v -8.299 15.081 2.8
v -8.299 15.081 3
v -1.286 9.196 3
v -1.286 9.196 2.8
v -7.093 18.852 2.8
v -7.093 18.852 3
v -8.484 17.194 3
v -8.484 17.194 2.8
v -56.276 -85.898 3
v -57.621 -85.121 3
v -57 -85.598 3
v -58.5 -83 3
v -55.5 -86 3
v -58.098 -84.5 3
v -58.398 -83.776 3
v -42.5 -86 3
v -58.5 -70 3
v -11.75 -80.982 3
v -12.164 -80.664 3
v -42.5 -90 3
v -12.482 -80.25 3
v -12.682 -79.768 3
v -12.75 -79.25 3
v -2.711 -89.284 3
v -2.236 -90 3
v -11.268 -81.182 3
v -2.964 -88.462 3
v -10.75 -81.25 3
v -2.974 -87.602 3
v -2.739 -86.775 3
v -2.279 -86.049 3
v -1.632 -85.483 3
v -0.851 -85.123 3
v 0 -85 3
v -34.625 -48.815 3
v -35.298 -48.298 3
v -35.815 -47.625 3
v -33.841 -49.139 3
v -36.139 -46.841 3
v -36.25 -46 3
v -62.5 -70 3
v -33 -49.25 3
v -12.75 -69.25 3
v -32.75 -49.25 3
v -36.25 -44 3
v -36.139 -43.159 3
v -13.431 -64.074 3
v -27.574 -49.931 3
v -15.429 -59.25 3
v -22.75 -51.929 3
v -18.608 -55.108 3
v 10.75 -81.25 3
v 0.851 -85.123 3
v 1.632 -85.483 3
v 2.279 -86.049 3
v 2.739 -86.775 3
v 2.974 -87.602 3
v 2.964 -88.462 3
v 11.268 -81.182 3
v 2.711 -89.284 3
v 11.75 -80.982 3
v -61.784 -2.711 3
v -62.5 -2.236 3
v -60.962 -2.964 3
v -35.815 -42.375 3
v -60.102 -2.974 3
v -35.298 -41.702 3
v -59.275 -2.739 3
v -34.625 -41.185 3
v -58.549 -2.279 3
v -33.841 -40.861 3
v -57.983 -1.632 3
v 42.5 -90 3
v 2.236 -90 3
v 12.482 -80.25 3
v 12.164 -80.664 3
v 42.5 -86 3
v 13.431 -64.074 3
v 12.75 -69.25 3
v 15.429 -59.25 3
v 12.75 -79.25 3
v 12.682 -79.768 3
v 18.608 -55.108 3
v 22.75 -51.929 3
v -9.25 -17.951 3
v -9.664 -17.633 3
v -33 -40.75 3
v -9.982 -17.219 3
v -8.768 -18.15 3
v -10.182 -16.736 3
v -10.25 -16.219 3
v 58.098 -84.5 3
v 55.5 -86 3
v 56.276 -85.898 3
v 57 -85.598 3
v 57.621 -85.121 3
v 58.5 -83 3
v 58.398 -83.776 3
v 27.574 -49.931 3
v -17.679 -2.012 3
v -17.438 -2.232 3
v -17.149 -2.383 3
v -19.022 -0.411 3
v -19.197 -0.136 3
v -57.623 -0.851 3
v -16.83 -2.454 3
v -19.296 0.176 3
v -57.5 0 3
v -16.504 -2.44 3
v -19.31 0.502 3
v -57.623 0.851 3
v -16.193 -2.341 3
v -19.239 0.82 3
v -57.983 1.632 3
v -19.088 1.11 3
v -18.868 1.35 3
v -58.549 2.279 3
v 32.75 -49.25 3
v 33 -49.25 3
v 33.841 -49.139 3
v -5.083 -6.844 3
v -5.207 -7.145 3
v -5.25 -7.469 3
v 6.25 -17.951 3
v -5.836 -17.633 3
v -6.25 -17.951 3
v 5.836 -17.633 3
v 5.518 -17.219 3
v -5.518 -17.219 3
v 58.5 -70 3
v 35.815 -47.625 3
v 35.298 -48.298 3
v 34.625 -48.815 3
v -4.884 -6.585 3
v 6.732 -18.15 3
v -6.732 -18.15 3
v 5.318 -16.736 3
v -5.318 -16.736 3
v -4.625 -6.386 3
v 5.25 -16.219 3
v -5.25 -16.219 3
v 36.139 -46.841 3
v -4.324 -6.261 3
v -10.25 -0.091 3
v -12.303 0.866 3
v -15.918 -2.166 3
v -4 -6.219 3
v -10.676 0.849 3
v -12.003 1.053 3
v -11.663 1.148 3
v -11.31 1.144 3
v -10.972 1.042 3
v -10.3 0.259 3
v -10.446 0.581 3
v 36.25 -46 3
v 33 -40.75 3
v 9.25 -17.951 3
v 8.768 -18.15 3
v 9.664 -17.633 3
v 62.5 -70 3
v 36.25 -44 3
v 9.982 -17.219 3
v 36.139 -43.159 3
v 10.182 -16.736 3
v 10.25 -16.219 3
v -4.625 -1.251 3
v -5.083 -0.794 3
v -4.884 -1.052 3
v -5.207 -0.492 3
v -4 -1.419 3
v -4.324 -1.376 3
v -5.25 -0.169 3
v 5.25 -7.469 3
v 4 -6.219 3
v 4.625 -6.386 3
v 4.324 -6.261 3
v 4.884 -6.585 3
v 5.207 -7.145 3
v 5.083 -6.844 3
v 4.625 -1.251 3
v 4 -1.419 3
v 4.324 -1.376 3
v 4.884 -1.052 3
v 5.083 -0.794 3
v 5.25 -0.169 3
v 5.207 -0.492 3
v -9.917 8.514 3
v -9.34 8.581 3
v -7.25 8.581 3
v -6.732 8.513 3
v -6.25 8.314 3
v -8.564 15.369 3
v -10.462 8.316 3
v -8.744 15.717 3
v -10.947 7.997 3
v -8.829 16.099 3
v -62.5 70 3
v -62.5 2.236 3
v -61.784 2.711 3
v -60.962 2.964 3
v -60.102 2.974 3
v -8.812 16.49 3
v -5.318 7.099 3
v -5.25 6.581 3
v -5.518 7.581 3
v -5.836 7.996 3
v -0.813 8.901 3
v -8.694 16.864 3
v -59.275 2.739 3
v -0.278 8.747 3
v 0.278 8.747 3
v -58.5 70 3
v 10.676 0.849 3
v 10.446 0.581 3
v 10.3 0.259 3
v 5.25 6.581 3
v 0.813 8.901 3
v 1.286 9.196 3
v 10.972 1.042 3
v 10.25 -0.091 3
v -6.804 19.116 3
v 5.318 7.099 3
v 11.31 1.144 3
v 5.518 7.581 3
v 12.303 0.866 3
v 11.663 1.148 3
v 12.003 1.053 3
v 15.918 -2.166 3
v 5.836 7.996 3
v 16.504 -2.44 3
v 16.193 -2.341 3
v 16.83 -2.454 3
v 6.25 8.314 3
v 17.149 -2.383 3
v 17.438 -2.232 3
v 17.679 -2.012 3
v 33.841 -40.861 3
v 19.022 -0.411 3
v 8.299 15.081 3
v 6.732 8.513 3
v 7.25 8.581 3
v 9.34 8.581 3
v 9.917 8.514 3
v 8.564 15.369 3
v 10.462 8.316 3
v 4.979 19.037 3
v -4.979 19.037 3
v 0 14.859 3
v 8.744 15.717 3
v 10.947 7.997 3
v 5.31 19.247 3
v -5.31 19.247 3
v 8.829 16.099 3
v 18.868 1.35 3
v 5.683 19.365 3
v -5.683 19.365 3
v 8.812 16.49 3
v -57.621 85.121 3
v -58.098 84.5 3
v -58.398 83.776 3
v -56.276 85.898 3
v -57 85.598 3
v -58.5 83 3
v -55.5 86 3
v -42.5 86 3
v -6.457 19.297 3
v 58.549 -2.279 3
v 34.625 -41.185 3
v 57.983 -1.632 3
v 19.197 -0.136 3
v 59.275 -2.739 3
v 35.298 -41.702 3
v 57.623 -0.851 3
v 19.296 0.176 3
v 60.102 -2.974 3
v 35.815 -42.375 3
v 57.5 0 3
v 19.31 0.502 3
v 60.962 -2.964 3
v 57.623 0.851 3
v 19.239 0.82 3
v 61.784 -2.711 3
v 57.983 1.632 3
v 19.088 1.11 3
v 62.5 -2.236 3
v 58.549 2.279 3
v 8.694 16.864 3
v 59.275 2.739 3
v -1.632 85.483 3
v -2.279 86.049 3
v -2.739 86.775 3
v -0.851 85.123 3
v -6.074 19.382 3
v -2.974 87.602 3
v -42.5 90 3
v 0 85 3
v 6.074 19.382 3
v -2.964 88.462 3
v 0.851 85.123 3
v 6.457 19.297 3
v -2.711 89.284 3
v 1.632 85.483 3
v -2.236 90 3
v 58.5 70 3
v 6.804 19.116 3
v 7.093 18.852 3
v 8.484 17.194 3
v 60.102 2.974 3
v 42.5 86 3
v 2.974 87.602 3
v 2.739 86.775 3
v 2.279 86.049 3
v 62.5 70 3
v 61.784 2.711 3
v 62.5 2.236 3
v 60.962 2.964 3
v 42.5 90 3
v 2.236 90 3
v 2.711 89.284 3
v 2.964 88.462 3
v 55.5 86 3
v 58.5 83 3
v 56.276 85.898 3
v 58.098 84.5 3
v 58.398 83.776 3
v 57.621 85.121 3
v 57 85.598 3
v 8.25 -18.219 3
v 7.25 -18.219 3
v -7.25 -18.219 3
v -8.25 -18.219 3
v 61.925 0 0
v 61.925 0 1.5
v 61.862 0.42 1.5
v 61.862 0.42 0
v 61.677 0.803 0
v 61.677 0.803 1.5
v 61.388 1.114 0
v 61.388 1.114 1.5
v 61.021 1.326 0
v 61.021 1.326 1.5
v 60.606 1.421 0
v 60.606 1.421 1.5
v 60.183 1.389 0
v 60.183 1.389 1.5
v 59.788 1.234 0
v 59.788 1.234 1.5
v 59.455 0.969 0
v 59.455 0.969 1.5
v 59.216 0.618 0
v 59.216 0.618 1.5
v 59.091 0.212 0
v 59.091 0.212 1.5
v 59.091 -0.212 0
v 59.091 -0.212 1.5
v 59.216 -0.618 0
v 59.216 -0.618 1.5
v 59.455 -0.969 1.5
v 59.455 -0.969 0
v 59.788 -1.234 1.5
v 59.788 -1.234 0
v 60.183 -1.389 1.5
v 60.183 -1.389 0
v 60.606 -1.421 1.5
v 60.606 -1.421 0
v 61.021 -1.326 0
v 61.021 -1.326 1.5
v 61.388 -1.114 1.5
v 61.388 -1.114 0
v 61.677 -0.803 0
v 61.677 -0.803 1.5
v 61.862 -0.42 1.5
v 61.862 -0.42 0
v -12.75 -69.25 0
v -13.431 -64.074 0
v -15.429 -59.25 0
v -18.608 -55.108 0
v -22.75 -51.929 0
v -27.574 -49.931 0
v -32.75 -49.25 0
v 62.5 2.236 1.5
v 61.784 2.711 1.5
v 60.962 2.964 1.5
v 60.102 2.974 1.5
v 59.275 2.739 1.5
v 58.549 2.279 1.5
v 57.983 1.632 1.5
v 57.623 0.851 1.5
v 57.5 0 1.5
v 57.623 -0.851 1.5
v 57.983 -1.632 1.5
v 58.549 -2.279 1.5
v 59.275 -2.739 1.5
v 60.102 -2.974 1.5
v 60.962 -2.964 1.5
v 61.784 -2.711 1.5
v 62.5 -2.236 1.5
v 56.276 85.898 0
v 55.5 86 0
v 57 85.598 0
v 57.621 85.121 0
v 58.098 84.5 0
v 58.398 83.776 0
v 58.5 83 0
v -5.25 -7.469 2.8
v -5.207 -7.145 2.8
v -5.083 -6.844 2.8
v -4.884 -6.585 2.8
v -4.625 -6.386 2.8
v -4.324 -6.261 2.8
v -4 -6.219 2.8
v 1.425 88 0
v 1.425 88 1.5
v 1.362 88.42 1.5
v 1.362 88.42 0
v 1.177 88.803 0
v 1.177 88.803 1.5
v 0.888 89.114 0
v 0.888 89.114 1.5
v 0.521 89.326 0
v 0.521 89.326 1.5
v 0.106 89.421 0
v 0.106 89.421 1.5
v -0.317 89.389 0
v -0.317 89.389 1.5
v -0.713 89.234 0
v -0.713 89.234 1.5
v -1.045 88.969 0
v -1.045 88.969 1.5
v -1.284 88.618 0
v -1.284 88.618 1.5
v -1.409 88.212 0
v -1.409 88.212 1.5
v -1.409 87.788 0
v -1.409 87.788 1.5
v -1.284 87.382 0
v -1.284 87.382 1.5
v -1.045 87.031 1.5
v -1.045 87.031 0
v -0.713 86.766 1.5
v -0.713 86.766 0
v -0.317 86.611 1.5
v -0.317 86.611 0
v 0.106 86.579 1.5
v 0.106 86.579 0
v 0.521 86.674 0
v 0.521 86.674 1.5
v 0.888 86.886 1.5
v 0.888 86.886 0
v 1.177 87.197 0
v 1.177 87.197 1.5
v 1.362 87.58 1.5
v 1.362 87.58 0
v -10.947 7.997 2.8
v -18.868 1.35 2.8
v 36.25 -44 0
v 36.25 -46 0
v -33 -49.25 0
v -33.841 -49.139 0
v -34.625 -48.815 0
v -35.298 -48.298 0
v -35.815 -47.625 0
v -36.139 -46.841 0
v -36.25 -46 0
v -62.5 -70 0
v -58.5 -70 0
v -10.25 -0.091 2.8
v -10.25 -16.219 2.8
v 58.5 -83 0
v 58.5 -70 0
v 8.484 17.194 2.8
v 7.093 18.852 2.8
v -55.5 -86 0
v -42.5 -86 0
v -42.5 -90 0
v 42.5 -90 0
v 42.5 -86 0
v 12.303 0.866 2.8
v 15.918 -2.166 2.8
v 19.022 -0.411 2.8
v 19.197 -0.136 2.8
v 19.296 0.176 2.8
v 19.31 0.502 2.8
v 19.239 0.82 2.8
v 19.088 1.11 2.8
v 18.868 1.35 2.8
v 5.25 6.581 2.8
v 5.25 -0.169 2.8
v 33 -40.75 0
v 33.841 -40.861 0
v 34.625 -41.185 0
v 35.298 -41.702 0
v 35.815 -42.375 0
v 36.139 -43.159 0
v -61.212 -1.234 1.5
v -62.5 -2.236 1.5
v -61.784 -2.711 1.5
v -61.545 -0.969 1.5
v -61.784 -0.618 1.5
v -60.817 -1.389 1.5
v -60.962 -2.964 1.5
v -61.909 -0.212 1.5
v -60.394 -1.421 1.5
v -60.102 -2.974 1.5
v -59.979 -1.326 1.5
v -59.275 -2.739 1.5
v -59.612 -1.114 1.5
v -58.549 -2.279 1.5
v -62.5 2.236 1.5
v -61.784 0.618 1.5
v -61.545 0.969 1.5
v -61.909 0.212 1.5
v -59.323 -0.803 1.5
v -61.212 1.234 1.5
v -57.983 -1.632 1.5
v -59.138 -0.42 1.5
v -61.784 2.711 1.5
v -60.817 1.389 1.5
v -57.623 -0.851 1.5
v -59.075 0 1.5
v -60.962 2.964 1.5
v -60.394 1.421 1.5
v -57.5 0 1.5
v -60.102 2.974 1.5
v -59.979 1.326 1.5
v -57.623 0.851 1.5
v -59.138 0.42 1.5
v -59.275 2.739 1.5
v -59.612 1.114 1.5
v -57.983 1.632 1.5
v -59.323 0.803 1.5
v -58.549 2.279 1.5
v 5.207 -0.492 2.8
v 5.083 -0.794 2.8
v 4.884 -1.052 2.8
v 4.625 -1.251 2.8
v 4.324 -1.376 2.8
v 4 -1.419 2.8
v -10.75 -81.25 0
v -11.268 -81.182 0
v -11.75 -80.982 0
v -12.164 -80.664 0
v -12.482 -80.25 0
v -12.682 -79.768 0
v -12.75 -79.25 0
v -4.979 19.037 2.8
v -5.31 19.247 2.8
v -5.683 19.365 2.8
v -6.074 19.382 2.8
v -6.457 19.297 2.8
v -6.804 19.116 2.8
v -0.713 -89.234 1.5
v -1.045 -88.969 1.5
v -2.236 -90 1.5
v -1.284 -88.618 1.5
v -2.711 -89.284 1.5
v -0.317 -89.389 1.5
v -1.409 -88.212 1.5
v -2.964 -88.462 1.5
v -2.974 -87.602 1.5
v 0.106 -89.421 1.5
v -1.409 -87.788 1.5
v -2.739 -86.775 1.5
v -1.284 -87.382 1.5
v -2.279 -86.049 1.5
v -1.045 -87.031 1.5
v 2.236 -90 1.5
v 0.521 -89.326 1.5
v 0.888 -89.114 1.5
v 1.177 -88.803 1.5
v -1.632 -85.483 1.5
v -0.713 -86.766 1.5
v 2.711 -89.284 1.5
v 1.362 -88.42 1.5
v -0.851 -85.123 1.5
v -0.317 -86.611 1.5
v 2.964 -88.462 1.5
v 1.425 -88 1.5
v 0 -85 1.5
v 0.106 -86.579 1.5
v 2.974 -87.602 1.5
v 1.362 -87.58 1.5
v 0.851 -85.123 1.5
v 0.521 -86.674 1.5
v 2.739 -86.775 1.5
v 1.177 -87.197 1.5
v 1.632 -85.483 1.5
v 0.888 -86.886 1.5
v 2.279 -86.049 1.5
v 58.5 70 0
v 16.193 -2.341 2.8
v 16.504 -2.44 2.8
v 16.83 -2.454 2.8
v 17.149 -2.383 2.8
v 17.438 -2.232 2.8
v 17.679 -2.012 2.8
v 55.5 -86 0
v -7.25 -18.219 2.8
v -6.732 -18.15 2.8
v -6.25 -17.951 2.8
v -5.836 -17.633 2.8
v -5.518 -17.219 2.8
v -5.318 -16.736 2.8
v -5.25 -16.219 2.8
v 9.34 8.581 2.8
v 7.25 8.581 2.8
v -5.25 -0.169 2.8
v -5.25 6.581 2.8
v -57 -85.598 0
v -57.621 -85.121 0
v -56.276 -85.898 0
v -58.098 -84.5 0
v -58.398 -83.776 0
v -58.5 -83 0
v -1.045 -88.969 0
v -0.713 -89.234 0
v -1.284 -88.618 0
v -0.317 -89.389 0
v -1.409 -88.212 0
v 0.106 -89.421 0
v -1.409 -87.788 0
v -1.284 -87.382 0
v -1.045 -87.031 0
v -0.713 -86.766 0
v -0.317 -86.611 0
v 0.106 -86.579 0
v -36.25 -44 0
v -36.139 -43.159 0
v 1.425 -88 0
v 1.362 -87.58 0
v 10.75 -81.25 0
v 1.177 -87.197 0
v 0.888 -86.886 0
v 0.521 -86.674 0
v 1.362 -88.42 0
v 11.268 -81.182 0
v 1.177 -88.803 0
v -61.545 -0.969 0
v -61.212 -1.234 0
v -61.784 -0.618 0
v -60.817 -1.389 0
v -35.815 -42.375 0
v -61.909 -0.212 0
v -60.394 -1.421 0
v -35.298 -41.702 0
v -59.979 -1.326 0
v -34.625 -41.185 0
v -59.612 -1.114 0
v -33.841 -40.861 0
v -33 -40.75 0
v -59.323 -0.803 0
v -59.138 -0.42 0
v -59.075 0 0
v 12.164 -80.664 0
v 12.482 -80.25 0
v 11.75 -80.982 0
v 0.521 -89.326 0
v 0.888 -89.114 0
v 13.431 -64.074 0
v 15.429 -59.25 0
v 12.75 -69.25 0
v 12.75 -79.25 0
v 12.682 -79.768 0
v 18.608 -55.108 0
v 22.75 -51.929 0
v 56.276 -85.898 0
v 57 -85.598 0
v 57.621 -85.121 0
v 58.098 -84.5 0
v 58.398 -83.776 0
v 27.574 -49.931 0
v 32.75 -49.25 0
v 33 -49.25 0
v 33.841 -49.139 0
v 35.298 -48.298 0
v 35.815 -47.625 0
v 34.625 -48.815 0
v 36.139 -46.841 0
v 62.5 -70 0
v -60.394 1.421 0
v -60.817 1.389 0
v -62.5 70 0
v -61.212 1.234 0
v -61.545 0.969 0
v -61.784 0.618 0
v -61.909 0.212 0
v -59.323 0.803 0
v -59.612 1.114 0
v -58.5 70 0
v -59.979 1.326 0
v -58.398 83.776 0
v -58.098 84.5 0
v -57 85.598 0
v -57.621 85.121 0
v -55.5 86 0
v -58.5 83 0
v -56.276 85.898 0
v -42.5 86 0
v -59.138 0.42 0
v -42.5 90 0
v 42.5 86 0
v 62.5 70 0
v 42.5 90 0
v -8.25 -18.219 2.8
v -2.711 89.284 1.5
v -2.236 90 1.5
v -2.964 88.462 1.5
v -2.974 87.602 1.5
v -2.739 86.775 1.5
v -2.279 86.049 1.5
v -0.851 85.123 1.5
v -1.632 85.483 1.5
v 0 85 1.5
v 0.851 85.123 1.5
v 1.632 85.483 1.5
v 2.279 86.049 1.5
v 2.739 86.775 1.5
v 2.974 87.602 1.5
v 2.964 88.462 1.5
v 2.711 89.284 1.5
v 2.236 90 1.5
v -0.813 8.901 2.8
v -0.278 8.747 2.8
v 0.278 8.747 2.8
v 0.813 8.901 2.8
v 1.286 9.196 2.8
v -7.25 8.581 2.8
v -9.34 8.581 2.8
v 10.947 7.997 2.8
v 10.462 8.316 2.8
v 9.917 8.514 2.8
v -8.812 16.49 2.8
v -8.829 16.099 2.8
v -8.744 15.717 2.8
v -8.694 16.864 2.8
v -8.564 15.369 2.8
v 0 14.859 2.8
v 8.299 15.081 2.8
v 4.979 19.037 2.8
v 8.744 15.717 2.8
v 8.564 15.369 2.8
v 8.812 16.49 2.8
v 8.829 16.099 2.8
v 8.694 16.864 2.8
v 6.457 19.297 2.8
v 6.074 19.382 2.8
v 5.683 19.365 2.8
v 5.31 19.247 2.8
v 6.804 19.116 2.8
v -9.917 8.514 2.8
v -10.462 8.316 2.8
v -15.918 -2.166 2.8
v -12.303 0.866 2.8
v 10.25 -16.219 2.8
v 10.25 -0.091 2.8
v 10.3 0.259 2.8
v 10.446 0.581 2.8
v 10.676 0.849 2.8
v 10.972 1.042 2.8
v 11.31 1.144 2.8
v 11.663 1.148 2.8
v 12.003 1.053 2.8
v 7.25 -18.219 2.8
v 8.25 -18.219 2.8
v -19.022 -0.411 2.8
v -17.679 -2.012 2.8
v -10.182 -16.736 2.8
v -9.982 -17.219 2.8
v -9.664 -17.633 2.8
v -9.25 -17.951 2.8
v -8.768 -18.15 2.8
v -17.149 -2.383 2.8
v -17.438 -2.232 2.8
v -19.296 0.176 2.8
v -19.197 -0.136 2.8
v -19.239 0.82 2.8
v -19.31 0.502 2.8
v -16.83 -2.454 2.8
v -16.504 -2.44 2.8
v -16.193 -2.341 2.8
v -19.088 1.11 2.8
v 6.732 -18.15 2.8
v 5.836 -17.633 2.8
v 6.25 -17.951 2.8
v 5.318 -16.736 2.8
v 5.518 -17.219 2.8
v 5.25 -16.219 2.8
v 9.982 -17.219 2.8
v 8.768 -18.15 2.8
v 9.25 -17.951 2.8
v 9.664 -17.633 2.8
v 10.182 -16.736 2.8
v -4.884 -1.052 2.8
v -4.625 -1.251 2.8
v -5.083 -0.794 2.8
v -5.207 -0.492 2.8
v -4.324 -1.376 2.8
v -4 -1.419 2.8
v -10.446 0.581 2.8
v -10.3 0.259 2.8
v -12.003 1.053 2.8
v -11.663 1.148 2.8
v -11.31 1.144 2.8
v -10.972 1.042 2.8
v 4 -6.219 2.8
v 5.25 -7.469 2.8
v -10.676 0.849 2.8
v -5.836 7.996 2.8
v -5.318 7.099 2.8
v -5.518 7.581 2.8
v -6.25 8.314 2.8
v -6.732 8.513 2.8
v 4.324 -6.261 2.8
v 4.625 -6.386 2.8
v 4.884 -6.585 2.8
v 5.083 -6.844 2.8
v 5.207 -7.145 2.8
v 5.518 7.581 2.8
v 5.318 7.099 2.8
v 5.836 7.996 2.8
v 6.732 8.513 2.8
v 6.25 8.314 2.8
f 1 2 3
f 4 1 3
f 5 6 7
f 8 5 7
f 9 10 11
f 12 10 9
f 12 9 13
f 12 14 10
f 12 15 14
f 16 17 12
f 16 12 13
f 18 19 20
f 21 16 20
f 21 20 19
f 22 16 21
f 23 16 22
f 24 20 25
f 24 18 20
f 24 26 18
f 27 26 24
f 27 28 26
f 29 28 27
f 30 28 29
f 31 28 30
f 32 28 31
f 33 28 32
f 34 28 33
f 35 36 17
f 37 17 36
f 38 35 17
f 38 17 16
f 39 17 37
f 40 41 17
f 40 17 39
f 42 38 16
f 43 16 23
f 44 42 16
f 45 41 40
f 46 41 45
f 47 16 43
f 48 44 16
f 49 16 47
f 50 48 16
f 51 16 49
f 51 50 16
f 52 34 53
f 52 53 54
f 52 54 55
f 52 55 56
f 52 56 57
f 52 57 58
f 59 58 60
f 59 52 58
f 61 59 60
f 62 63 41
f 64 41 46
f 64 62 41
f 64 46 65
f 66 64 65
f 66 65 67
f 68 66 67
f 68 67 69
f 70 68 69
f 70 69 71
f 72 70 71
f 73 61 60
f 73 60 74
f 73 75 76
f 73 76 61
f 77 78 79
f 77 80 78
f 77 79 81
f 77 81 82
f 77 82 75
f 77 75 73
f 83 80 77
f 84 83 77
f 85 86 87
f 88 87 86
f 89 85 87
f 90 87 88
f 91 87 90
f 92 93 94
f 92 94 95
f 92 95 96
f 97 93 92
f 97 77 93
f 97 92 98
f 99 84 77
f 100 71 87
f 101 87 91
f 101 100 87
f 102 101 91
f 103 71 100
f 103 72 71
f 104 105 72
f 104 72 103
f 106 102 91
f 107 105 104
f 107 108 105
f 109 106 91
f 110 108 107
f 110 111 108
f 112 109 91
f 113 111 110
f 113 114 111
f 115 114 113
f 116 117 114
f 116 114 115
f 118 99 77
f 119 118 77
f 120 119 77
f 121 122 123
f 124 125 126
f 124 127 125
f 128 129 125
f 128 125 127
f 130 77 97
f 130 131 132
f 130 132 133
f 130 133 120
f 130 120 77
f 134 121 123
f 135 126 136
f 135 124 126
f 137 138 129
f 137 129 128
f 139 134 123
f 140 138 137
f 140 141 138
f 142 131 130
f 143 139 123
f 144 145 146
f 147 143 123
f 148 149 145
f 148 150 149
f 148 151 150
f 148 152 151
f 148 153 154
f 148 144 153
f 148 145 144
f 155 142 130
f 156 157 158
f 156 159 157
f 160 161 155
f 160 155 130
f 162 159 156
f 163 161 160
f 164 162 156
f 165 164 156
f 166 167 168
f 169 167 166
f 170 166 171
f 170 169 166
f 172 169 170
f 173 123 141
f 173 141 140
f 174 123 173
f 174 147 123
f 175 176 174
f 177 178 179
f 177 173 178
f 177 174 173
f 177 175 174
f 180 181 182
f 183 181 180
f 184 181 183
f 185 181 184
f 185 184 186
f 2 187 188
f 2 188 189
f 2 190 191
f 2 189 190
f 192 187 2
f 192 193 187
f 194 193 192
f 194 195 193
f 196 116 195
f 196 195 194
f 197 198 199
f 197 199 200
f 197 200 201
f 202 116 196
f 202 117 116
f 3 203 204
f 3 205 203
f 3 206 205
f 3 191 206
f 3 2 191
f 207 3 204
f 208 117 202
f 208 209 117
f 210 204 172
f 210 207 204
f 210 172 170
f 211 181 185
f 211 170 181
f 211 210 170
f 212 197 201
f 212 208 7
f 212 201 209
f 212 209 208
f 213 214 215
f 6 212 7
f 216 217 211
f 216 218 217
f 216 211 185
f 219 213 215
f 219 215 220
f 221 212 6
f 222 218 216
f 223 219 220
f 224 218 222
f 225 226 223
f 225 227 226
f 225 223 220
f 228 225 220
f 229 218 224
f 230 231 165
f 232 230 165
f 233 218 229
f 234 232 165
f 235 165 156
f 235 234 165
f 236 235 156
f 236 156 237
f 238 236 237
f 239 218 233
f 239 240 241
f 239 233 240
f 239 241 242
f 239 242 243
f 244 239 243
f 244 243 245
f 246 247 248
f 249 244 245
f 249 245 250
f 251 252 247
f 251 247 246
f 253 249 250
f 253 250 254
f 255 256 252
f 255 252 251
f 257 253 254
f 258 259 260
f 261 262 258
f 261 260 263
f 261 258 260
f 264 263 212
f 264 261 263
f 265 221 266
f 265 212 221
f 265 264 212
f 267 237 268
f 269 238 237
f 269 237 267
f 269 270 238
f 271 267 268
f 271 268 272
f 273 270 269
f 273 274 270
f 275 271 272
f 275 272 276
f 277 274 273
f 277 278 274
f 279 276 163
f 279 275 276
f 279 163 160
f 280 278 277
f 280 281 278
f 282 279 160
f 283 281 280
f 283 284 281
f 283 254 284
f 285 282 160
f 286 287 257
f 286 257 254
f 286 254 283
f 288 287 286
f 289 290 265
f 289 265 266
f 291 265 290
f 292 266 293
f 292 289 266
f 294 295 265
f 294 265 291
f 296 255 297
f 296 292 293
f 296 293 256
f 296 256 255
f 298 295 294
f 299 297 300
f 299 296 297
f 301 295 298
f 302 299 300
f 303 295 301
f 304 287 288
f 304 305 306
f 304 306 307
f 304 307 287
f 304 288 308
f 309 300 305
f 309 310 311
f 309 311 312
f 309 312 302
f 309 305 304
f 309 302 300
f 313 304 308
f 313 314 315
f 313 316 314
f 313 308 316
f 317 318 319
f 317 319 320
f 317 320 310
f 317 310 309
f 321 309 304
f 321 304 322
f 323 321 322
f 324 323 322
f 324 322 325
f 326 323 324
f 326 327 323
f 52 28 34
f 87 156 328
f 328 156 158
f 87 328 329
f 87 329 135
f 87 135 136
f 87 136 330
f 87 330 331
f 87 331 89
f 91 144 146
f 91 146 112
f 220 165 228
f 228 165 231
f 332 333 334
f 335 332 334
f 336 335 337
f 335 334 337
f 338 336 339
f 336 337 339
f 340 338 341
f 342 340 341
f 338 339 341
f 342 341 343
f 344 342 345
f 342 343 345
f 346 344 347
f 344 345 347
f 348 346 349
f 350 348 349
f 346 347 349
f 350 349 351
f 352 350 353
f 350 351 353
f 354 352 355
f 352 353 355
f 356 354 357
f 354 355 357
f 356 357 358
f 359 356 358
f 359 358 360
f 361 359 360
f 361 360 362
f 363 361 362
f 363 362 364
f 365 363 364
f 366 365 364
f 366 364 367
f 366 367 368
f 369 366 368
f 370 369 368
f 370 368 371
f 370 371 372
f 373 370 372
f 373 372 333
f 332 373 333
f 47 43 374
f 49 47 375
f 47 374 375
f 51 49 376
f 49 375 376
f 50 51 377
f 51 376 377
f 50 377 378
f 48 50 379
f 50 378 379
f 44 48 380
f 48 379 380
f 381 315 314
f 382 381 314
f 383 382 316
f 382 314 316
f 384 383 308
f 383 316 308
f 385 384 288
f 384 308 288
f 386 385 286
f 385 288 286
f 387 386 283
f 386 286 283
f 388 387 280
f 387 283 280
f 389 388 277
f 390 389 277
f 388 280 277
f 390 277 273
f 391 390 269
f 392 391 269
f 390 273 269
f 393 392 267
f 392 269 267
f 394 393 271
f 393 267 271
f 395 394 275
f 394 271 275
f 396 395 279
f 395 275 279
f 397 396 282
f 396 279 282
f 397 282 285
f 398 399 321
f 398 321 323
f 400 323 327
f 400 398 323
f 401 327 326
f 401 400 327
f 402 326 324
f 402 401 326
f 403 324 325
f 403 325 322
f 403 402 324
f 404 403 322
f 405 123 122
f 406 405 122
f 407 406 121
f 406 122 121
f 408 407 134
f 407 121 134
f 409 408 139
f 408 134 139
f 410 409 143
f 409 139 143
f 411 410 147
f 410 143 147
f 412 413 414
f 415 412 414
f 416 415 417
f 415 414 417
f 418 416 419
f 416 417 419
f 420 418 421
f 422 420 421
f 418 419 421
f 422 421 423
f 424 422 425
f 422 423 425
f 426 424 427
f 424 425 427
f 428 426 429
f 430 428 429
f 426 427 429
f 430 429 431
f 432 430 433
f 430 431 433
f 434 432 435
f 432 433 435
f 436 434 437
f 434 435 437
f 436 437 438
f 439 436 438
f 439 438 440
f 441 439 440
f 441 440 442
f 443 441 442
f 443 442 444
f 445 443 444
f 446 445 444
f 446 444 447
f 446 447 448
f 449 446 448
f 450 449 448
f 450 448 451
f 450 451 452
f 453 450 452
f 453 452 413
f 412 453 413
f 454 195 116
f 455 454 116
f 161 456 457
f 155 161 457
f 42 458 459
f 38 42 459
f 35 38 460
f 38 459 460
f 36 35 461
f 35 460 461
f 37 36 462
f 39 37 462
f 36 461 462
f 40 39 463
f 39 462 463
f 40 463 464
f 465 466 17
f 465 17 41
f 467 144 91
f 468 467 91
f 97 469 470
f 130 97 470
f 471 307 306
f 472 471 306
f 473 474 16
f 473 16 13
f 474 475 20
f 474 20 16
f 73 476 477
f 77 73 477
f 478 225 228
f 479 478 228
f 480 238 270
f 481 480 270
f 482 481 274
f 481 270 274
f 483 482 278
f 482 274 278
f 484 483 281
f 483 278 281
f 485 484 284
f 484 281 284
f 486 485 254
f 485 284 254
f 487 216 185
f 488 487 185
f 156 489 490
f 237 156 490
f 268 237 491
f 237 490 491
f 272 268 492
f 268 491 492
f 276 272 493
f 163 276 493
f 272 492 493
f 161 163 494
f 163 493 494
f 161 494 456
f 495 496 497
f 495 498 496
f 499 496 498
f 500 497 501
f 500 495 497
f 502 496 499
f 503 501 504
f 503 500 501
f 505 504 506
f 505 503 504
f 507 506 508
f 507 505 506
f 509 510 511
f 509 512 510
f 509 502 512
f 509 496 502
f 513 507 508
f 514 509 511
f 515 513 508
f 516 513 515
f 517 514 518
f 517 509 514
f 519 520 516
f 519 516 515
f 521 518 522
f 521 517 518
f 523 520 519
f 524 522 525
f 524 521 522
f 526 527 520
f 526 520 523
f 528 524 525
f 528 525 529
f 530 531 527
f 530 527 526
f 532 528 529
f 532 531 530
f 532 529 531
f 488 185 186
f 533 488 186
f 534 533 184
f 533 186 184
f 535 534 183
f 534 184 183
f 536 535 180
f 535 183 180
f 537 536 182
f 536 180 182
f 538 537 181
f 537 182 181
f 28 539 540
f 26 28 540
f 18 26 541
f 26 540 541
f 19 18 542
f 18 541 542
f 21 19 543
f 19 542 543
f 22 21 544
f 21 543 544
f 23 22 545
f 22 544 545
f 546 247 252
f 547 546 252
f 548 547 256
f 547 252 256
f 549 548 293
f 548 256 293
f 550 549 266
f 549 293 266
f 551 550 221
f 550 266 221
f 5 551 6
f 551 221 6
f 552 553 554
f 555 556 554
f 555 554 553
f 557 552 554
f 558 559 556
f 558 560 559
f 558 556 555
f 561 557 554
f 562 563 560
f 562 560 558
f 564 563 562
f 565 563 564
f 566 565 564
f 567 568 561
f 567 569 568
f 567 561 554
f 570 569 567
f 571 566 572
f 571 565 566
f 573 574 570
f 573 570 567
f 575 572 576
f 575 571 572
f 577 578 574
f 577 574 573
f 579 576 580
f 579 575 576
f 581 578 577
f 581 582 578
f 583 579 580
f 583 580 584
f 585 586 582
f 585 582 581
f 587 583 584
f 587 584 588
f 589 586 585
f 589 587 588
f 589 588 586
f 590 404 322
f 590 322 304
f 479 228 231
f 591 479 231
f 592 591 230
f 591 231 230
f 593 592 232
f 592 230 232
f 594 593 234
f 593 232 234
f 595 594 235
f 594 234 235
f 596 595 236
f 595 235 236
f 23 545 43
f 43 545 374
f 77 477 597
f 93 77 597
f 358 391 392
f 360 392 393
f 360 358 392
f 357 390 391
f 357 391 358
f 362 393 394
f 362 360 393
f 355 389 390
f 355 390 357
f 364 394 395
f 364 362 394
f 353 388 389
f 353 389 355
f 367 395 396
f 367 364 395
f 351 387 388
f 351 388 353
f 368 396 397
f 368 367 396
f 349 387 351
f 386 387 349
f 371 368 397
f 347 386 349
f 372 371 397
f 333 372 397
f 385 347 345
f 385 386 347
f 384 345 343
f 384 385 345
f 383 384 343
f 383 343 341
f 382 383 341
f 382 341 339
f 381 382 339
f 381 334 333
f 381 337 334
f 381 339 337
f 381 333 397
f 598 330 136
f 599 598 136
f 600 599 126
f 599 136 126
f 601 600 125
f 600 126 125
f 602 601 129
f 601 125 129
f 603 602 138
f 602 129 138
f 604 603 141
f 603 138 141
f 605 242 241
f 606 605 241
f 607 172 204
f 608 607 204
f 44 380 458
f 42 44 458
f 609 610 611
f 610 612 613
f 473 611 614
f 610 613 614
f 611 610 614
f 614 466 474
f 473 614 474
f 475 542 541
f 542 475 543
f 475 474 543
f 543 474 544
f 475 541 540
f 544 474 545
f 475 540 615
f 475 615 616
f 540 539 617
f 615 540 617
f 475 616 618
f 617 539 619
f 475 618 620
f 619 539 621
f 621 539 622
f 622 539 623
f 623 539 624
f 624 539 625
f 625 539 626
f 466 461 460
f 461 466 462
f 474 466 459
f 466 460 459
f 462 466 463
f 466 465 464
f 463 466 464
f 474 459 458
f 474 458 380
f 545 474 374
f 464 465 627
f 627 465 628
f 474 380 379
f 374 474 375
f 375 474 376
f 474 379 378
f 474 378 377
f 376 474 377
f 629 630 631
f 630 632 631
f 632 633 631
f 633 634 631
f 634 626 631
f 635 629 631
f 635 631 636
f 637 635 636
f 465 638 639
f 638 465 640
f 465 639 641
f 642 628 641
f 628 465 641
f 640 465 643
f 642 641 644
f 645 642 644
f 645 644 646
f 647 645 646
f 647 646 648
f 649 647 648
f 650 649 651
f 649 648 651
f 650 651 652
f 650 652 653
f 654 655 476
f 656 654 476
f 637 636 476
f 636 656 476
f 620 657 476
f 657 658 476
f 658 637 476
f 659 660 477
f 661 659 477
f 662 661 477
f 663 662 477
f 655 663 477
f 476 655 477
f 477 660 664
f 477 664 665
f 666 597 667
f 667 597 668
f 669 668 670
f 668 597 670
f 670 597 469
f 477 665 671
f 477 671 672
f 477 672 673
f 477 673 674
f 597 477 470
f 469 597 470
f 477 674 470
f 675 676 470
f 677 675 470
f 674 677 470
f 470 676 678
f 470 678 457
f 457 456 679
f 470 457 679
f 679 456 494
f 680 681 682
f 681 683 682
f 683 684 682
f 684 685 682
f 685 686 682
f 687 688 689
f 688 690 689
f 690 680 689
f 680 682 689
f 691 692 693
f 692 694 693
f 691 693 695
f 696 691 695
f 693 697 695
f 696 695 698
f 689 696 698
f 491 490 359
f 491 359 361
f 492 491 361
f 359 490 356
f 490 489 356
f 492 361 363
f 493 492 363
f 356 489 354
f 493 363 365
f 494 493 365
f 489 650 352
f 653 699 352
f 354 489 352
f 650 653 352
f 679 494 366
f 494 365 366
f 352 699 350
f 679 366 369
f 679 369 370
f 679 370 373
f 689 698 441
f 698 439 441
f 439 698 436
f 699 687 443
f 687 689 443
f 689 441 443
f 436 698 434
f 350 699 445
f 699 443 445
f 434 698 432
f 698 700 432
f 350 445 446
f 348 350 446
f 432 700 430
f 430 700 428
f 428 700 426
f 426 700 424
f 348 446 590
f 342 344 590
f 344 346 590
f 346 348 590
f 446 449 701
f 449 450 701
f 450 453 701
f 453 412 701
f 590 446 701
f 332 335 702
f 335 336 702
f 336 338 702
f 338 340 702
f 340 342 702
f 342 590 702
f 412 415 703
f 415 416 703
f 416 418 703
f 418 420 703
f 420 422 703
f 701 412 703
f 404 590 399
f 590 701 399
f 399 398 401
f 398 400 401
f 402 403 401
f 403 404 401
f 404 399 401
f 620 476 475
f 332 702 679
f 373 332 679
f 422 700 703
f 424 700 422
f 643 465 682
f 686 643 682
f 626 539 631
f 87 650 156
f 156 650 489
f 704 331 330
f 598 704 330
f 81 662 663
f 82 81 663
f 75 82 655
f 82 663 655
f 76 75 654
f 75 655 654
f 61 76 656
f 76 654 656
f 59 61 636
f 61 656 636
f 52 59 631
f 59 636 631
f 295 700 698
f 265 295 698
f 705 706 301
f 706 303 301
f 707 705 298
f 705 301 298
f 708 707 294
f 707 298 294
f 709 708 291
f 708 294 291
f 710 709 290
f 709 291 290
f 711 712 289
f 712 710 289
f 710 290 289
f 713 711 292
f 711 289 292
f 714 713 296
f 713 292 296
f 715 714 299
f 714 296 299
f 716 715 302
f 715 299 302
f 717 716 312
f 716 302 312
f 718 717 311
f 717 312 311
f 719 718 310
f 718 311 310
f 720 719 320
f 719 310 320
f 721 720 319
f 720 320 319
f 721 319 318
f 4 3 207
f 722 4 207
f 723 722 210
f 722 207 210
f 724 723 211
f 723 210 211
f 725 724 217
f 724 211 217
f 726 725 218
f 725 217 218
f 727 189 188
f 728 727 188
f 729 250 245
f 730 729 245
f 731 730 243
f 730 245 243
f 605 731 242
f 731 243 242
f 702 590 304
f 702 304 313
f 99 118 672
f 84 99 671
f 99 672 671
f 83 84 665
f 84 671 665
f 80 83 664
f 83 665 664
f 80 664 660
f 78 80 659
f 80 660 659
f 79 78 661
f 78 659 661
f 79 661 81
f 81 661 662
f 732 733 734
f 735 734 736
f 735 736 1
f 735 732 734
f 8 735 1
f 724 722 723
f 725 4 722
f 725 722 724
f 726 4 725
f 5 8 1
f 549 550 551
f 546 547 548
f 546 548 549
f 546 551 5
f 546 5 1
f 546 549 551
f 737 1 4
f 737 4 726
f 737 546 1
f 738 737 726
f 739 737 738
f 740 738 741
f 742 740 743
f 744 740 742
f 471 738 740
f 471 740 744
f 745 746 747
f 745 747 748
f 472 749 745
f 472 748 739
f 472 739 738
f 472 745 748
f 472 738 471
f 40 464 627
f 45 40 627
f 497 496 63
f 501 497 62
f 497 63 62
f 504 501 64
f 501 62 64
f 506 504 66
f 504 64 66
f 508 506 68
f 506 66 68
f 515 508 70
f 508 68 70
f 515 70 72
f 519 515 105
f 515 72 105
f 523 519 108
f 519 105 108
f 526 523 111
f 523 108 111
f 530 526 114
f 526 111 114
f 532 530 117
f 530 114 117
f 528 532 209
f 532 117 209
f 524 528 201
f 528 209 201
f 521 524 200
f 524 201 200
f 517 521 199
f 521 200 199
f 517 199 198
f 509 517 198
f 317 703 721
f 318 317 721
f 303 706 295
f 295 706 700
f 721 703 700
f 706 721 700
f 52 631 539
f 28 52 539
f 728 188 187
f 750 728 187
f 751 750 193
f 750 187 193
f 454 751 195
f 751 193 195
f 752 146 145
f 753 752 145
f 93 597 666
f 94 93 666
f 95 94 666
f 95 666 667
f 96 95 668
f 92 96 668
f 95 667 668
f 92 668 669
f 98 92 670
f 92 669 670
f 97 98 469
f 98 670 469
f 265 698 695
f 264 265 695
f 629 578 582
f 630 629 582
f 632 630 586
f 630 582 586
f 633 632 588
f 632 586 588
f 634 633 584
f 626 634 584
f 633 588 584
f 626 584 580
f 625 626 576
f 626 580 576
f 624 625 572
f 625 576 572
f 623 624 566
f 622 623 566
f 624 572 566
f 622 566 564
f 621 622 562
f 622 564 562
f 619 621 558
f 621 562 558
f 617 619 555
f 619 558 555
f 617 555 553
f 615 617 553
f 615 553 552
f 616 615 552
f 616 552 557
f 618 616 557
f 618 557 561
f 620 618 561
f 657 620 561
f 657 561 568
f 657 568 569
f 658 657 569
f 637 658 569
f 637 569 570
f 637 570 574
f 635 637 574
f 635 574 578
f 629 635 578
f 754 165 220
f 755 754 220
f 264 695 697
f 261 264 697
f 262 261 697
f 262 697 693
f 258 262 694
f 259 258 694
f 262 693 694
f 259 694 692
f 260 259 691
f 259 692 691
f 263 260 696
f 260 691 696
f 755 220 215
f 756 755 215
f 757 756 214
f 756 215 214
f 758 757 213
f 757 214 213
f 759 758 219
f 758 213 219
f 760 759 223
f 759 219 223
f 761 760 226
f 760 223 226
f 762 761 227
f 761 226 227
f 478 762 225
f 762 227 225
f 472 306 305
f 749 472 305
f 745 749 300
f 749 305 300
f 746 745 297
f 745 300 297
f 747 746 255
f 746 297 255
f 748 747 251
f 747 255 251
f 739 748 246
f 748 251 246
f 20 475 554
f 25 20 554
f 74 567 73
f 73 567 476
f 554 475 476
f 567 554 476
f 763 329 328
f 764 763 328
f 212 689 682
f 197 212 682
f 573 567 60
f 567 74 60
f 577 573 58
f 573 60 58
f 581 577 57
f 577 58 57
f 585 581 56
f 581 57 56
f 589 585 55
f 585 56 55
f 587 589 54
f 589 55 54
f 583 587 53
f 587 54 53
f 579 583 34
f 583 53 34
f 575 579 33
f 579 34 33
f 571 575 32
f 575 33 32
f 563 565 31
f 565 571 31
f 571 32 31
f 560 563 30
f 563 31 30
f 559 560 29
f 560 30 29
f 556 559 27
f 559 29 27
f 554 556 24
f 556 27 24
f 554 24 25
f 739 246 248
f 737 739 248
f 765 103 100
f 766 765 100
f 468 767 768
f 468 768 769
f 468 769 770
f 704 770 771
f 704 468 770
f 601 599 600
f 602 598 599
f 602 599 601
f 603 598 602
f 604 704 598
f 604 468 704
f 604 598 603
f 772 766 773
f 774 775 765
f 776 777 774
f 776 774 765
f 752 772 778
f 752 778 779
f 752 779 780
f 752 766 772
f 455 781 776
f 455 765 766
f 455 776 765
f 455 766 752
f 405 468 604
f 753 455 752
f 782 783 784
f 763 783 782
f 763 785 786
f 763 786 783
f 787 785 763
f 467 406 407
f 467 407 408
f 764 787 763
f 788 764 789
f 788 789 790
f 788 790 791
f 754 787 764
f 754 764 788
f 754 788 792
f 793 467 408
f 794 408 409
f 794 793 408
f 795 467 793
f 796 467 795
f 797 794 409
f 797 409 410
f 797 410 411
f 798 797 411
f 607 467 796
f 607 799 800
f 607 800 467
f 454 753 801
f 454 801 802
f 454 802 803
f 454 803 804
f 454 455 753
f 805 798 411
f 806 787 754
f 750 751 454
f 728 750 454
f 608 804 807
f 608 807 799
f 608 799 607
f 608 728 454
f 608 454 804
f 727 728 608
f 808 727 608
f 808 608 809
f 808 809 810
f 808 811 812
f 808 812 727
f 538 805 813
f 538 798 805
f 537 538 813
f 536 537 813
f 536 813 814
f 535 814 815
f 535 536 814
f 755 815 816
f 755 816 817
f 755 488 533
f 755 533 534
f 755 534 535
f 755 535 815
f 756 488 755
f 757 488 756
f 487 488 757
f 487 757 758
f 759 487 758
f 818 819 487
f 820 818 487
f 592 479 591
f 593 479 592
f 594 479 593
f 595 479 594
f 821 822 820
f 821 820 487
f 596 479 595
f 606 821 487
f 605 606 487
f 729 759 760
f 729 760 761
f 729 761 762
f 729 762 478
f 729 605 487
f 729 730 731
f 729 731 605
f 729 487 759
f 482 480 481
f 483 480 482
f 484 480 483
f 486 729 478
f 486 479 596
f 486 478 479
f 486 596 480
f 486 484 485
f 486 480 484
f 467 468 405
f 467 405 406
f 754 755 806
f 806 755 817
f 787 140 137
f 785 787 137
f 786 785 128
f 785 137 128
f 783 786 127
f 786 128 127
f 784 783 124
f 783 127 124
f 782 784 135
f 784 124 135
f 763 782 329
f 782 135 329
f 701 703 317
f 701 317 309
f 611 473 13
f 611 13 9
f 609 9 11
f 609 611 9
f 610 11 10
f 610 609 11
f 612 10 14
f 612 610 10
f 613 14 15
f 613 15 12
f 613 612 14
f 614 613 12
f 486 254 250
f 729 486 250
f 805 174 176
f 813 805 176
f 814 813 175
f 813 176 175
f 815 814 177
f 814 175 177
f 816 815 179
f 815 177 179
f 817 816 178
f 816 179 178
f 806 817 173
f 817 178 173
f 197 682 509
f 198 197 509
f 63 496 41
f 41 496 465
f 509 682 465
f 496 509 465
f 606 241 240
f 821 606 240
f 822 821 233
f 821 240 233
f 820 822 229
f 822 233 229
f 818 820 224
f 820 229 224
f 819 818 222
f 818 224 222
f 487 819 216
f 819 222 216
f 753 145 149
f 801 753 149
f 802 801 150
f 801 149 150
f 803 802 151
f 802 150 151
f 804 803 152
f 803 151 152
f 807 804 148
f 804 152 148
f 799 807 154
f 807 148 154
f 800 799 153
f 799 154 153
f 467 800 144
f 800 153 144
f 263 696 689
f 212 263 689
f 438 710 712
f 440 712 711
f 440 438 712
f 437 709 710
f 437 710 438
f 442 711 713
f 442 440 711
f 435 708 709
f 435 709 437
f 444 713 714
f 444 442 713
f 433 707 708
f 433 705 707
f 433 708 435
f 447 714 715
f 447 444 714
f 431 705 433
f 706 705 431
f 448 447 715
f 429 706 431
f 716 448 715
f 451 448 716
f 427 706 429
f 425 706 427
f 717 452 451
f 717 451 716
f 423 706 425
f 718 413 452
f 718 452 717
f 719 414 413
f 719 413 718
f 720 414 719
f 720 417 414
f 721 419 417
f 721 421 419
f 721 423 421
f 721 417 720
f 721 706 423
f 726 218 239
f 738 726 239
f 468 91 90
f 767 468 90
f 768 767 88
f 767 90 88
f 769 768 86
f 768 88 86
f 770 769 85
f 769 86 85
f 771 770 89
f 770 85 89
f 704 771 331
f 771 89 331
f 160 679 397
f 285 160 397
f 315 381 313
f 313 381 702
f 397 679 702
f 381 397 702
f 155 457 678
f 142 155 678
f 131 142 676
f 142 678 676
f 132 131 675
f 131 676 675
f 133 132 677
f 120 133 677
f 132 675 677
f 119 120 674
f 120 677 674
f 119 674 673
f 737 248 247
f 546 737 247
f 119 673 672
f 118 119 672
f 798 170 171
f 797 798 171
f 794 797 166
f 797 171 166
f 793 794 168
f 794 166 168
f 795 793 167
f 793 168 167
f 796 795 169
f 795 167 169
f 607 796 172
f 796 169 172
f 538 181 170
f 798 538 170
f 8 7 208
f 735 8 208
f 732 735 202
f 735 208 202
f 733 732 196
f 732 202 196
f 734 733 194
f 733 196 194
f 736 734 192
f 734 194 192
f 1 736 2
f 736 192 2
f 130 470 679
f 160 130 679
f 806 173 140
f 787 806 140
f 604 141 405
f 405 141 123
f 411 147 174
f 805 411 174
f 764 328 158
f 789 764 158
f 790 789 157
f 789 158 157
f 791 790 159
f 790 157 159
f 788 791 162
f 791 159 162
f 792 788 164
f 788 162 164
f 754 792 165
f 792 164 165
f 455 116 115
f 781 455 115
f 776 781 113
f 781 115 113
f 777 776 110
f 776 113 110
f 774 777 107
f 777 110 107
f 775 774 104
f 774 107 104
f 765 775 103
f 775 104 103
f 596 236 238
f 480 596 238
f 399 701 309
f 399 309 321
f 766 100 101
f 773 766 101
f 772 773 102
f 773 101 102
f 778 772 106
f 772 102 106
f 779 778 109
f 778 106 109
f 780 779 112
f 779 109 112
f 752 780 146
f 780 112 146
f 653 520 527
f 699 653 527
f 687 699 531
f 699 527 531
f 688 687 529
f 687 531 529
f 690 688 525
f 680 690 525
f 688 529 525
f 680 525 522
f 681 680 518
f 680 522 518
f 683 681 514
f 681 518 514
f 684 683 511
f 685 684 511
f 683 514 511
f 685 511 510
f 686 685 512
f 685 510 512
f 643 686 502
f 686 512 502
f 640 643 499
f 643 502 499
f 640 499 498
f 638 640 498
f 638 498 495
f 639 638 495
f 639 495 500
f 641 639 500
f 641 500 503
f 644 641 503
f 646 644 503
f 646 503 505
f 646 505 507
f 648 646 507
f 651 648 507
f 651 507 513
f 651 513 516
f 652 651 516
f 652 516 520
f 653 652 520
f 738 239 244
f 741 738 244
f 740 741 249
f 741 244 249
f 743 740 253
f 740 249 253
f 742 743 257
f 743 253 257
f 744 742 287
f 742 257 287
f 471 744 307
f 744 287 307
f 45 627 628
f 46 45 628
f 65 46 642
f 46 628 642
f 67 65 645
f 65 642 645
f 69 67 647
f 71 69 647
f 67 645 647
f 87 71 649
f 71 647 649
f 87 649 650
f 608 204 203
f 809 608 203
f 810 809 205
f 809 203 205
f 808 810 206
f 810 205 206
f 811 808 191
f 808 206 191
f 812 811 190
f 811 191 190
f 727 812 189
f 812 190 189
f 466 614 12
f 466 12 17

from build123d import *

# Parameters (mm, degrees)
EXTRUDE_1_DEPTH     = 3
CUT_EXTRUDE_1_DEPTH = 10
SKETCH_3_R          = 3
CUT_EXTRUDE_2_DEPTH = 1.5
SKETCH_4_R          = 1.425
CUT_EXTRUDE_3_DEPTH = 2
CUT_EXTRUDE_4_DEPTH = 0.2
CUT_EXTRUDE_START   = -10
CUT_EXTRUDE_5_DEPTH = 10


with BuildPart() as part:
    # Эскиз1 → Бобышка-Вытянуть1 (new body)
    with BuildSketch(Plane.XY):
        with BuildLine():
            Line((-52.5, -90), (52.5, -90))
            ThreePointArc((52.5, -90), (59.571067812, -87.071067812), (62.5, -80))
            Line((62.5, -80), (62.5, 80))
            ThreePointArc((62.5, 80), (59.571067812, 87.071067812), (52.5, 90))
            Line((52.5, 90), (-52.5, 90))
            ThreePointArc((-52.5, 90), (-59.571067812, 87.071067812), (-62.5, 80))
            Line((-62.5, 80), (-62.5, -80))
            ThreePointArc((-62.5, -80), (-59.571067812, -87.071067812), (-52.5, -90))
        make_face()
    extrude(amount=EXTRUDE_1_DEPTH)

    # Эскиз2 → Вырез-Вытянуть1 (cut)
    with BuildSketch(Plane(origin=(0, 0, 0), x_dir=(-1, 0, 0), z_dir=(0, 0, -1))):
        with BuildLine():
            Line((-36.25, -44), (-36.25, -46))
            ThreePointArc((-36.25, -46), (-35.298097039, -48.298097039), (-33, -49.25))
            Line((-33, -49.25), (-32.75, -49.25))
            ThreePointArc((-32.75, -49.25), (-18.607864376, -55.107864376), (-12.75, -69.25))
            Line((-12.75, -69.25), (-12.75, -79.25))
            ThreePointArc((-12.75, -79.25), (-12.164213562, -80.664213562), (-10.75, -81.25))
            Line((-10.75, -81.25), (10.75, -81.25))
            ThreePointArc((10.75, -81.25), (12.164213562, -80.664213562), (12.75, -79.25))
            Line((12.75, -79.25), (12.75, -69.25))
            ThreePointArc((12.75, -69.25), (18.607864376, -55.107864376), (32.75, -49.25))
            Line((32.75, -49.25), (33, -49.25))
            ThreePointArc((33, -49.25), (35.298097039, -48.298097039), (36.25, -46))
            Line((36.25, -46), (36.25, -44))
            ThreePointArc((36.25, -44), (35.298097039, -41.701902961), (33, -40.75))
            Line((33, -40.75), (-33, -40.75))
            ThreePointArc((-33, -40.75), (-35.298097039, -41.701902961), (-36.25, -44))
        make_face()
    extrude(amount=-CUT_EXTRUDE_1_DEPTH, mode=Mode.SUBTRACT)

    # Эскиз3 → Вырез-Вытянуть2 (cut)
    with BuildSketch(Plane.XY.offset(3)):
        with Locations((0, 88)):
            Circle(SKETCH_3_R)
        with Locations((60.5, 0)):
            Circle(SKETCH_3_R)
        with Locations((0, -88)):
            Circle(SKETCH_3_R)
        with Locations((-60.5, 0)):
            Circle(SKETCH_3_R)
    extrude(amount=-CUT_EXTRUDE_2_DEPTH, mode=Mode.SUBTRACT)

    # Эскиз4 → Вырез-Вытянуть3 (cut)
    with BuildSketch(Plane.XY.offset(1.5)):
        with Locations((0, 88)):
            Circle(SKETCH_4_R)
        with Locations((60.5, 0)):
            Circle(SKETCH_4_R)
        with Locations((0, -88)):
            Circle(SKETCH_4_R)
        with Locations((-60.5, 0)):
            Circle(SKETCH_4_R)
    extrude(amount=-CUT_EXTRUDE_3_DEPTH, mode=Mode.SUBTRACT)

    # Эскиз5 → Вырез-Вытянуть4 (cut)
    with BuildSketch(Plane.XY.offset(3)):
        with BuildLine():
            Line((-10.25, -0.09106889), (-10.25, -16.21851864))
            ThreePointArc((-10.25, -16.21851864), (-9.664213562, -17.632732202), (-8.25, -18.21851864))
            Line((-8.25, -18.21851864), (-7.25, -18.21851864))
            ThreePointArc((-7.25, -18.21851864), (-5.835786438, -17.632732202), (-5.25, -16.21851864))
            Line((-5.25, -16.21851864), (-5.25, -7.46851864))
            ThreePointArc((-5.25, -7.46851864), (-4.883883476, -6.584635164), (-4, -6.21851864))
            Line((-4, -6.21851864), (4, -6.21851864))
            ThreePointArc((4, -6.21851864), (4.883883476, -6.584635164), (5.25, -7.46851864))
            Line((5.25, -7.46851864), (5.25, -16.21851864))
            ThreePointArc((5.25, -16.21851864), (5.835786438, -17.632732202), (7.25, -18.21851864))
            Line((7.25, -18.21851864), (8.25, -18.21851864))
            ThreePointArc((8.25, -18.21851864), (9.664213562, -17.632732202), (10.25, -16.21851864))
            Line((10.25, -16.21851864), (10.25, -0.09106889))
            ThreePointArc((10.25, -0.09106889), (10.971727173, 1.041815844), (12.303484512, 0.866486664))
            Line((12.303484512, 0.866486664), (15.917557024, -2.166080248))
            ThreePointArc((15.917557024, -2.166080248), (16.829986215, -2.453768066), (17.67859709, -2.012009206))
            Line((17.67859709, -2.012009206), (19.022071027, -0.410919315))
            ThreePointArc((19.022071027, -0.410919315), (19.309758846, 0.501509876), (18.867999985, 1.350120751))
            Line((18.867999985, 1.350120751), (10.947043439, 7.996592468))
            ThreePointArc((10.947043439, 7.996592468), (10.195124773, 8.430712912), (9.340074414, 8.58148136))
            Line((9.340074414, 8.58148136), (7.25, 8.58148136))
            ThreePointArc((7.25, 8.58148136), (5.835786438, 7.995694922), (5.25, 6.58148136))
            Line((5.25, 6.58148136), (5.25, -0.16851864))
            ThreePointArc((5.25, -0.16851864), (4.883883476, -1.052402116), (4, -1.41851864))
            Line((4, -1.41851864), (-4, -1.41851864))
            ThreePointArc((-4, -1.41851864), (-4.883883476, -1.052402116), (-5.25, -0.16851864))
            Line((-5.25, -0.16851864), (-5.25, 6.58148136))
            ThreePointArc((-5.25, 6.58148136), (-5.835786438, 7.995694922), (-7.25, 8.58148136))
            Line((-7.25, 8.58148136), (-9.340074414, 8.58148136))
            ThreePointArc((-9.340074414, 8.58148136), (-10.195124773, 8.430712912), (-10.947043439, 7.996592468))
            Line((-10.947043439, 7.996592468), (-18.867999985, 1.350120751))
            ThreePointArc((-18.867999985, 1.350120751), (-19.309758846, 0.501509876), (-19.022071027, -0.410919315))
            Line((-19.022071027, -0.410919315), (-17.67859709, -2.012009206))
            ThreePointArc((-17.67859709, -2.012009206), (-16.829986215, -2.453768066), (-15.917557024, -2.166080248))
            Line((-15.917557024, -2.166080248), (-12.303484512, 0.866486664))
            ThreePointArc((-12.303484512, 0.866486664), (-10.971727173, 1.041815844), (-10.25, -0.09106889))
        make_face()
        with BuildLine():
            Line((0, 14.858517807), (-4.979473915, 19.036792532))
            ThreePointArc((-4.979473915, 19.036792532), (-6.074388944, 19.382017915), (-7.092721994, 18.851907282))
            Line((-7.092721994, 18.851907282), (-8.483871936, 17.193999341))
            ThreePointArc((-8.483871936, 17.193999341), (-8.829097318, 16.099084312), (-8.298986686, 15.080751262))
            Line((-8.298986686, 15.080751262), (-1.285575219, 9.195800287))
            ThreePointArc((-1.285575219, 9.195800287), (0, 8.727889173), (1.285575219, 9.195800287))
            Line((1.285575219, 9.195800287), (8.298986686, 15.080751262))
            ThreePointArc((8.298986686, 15.080751262), (8.829097318, 16.099084312), (8.483871936, 17.193999341))
            Line((8.483871936, 17.193999341), (7.092721994, 18.851907282))
            ThreePointArc((7.092721994, 18.851907282), (6.074388944, 19.382017915), (4.979473915, 19.036792532))
            Line((4.979473915, 19.036792532), (0, 14.858517807))
        make_face()
    extrude(amount=-CUT_EXTRUDE_4_DEPTH, mode=Mode.SUBTRACT)

    # Эскиз8 → Вырез-Вытянуть5 (cut)
    with BuildSketch(Plane.XY.offset(3).offset(CUT_EXTRUDE_START)):
        with BuildLine():
            Line((-52.5, 90), (-42.5, 90))
            Line((-42.5, 90), (-42.5, 86))
            Line((-42.5, 86), (-55.5, 86))
            ThreePointArc((-55.5, 86), (-57.621320344, 85.121320344), (-58.5, 83))
            Line((-58.5, 83), (-58.5, 70))
            Line((-58.5, 70), (-62.5, 70))
            Line((-62.5, 70), (-62.5, 80))
            ThreePointArc((-62.5, 80), (-59.571067812, 87.071067812), (-52.5, 90))
        make_face()
        with BuildLine():
            Line((62.5, 70), (62.5, 80))
            ThreePointArc((62.5, 80), (59.571067812, 87.071067812), (52.5, 90))
            Line((52.5, 90), (42.5, 90))
            Line((42.5, 90), (42.5, 86))
            Line((42.5, 86), (55.5, 86))
            ThreePointArc((55.5, 86), (57.621320344, 85.121320344), (58.5, 83))
            Line((58.5, 83), (58.5, 70))
            Line((58.5, 70), (62.5, 70))
        make_face()
        with BuildLine():
            Line((52.5, -90), (42.5, -90))
            Line((42.5, -90), (42.5, -86))
            Line((42.5, -86), (55.5, -86))
            ThreePointArc((55.5, -86), (57.621320344, -85.121320344), (58.5, -83))
            Line((58.5, -83), (58.5, -70))
            Line((58.5, -70), (62.5, -70))
            Line((62.5, -70), (62.5, -80))
            ThreePointArc((62.5, -80), (59.571067812, -87.071067812), (52.5, -90))
        make_face()
        with BuildLine():
            Line((-62.5, -70), (-62.5, -80))
            ThreePointArc((-62.5, -80), (-59.571067812, -87.071067812), (-52.5, -90))
            Line((-52.5, -90), (-42.5, -90))
            Line((-42.5, -90), (-42.5, -86))
            Line((-42.5, -86), (-55.5, -86))
            ThreePointArc((-55.5, -86), (-57.621320344, -85.121320344), (-58.5, -83))
            Line((-58.5, -83), (-58.5, -70))
            Line((-58.5, -70), (-62.5, -70))
        make_face()
    extrude(amount=CUT_EXTRUDE_5_DEPTH, mode=Mode.SUBTRACT)


solid = part.part
